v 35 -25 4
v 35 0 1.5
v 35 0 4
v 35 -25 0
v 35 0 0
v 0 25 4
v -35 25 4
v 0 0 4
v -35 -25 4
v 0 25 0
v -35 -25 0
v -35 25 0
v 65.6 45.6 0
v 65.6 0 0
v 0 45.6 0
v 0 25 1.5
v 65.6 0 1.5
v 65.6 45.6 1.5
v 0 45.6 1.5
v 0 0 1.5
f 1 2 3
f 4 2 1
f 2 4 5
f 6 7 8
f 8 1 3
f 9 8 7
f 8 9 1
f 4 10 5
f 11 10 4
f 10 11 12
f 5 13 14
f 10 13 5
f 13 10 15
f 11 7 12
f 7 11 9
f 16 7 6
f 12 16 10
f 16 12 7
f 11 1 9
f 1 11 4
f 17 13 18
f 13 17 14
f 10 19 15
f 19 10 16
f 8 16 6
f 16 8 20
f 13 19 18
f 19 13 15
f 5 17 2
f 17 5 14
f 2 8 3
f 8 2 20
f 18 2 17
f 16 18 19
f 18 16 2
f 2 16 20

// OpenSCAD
// Two-part enclosure for small electronics board
// Print orientation: box upright, lid upside down (lip on top)

// ---- Box ----
box_x = 70;      // outer length (X)
box_y = 50;      // outer width (Y)
box_z = 30;      // outer height (Z)
wall  = 2;       // wall thickness
floor = 2;       // floor thickness

// ---- Lid ----
lip_t      = 1.5;   // lip wall thickness
lip_h      = 4;     // lip height
lip_x      = 65.6;  // lip outer length (X)
lip_y      = 45.6;  // lip outer width (Y)
clearance  = 0.2;   // clearance between lip and box opening
eps        = 0.5;   // cutter overshoot

$fn = 64;

difference() {
    union() {
        // Box
        translate([-box_x/2, -box_y/2, 0])
            cube([box_x, box_y, floor + wall]);   // floor + walls, open top

        // Lid (upside down: plate on bed, lip pointing up)
        translate([0, 0, 0])
            cube([lip_x, lip_y, lip_h + lip_t]);
    }

    // Clearance pocket inside lid (extends above top face)
    translate([0, 0, lip_t])
        cube([lip_x + 2*clearance, lip_y + 2*clearance, lip_h + eps]);
}
